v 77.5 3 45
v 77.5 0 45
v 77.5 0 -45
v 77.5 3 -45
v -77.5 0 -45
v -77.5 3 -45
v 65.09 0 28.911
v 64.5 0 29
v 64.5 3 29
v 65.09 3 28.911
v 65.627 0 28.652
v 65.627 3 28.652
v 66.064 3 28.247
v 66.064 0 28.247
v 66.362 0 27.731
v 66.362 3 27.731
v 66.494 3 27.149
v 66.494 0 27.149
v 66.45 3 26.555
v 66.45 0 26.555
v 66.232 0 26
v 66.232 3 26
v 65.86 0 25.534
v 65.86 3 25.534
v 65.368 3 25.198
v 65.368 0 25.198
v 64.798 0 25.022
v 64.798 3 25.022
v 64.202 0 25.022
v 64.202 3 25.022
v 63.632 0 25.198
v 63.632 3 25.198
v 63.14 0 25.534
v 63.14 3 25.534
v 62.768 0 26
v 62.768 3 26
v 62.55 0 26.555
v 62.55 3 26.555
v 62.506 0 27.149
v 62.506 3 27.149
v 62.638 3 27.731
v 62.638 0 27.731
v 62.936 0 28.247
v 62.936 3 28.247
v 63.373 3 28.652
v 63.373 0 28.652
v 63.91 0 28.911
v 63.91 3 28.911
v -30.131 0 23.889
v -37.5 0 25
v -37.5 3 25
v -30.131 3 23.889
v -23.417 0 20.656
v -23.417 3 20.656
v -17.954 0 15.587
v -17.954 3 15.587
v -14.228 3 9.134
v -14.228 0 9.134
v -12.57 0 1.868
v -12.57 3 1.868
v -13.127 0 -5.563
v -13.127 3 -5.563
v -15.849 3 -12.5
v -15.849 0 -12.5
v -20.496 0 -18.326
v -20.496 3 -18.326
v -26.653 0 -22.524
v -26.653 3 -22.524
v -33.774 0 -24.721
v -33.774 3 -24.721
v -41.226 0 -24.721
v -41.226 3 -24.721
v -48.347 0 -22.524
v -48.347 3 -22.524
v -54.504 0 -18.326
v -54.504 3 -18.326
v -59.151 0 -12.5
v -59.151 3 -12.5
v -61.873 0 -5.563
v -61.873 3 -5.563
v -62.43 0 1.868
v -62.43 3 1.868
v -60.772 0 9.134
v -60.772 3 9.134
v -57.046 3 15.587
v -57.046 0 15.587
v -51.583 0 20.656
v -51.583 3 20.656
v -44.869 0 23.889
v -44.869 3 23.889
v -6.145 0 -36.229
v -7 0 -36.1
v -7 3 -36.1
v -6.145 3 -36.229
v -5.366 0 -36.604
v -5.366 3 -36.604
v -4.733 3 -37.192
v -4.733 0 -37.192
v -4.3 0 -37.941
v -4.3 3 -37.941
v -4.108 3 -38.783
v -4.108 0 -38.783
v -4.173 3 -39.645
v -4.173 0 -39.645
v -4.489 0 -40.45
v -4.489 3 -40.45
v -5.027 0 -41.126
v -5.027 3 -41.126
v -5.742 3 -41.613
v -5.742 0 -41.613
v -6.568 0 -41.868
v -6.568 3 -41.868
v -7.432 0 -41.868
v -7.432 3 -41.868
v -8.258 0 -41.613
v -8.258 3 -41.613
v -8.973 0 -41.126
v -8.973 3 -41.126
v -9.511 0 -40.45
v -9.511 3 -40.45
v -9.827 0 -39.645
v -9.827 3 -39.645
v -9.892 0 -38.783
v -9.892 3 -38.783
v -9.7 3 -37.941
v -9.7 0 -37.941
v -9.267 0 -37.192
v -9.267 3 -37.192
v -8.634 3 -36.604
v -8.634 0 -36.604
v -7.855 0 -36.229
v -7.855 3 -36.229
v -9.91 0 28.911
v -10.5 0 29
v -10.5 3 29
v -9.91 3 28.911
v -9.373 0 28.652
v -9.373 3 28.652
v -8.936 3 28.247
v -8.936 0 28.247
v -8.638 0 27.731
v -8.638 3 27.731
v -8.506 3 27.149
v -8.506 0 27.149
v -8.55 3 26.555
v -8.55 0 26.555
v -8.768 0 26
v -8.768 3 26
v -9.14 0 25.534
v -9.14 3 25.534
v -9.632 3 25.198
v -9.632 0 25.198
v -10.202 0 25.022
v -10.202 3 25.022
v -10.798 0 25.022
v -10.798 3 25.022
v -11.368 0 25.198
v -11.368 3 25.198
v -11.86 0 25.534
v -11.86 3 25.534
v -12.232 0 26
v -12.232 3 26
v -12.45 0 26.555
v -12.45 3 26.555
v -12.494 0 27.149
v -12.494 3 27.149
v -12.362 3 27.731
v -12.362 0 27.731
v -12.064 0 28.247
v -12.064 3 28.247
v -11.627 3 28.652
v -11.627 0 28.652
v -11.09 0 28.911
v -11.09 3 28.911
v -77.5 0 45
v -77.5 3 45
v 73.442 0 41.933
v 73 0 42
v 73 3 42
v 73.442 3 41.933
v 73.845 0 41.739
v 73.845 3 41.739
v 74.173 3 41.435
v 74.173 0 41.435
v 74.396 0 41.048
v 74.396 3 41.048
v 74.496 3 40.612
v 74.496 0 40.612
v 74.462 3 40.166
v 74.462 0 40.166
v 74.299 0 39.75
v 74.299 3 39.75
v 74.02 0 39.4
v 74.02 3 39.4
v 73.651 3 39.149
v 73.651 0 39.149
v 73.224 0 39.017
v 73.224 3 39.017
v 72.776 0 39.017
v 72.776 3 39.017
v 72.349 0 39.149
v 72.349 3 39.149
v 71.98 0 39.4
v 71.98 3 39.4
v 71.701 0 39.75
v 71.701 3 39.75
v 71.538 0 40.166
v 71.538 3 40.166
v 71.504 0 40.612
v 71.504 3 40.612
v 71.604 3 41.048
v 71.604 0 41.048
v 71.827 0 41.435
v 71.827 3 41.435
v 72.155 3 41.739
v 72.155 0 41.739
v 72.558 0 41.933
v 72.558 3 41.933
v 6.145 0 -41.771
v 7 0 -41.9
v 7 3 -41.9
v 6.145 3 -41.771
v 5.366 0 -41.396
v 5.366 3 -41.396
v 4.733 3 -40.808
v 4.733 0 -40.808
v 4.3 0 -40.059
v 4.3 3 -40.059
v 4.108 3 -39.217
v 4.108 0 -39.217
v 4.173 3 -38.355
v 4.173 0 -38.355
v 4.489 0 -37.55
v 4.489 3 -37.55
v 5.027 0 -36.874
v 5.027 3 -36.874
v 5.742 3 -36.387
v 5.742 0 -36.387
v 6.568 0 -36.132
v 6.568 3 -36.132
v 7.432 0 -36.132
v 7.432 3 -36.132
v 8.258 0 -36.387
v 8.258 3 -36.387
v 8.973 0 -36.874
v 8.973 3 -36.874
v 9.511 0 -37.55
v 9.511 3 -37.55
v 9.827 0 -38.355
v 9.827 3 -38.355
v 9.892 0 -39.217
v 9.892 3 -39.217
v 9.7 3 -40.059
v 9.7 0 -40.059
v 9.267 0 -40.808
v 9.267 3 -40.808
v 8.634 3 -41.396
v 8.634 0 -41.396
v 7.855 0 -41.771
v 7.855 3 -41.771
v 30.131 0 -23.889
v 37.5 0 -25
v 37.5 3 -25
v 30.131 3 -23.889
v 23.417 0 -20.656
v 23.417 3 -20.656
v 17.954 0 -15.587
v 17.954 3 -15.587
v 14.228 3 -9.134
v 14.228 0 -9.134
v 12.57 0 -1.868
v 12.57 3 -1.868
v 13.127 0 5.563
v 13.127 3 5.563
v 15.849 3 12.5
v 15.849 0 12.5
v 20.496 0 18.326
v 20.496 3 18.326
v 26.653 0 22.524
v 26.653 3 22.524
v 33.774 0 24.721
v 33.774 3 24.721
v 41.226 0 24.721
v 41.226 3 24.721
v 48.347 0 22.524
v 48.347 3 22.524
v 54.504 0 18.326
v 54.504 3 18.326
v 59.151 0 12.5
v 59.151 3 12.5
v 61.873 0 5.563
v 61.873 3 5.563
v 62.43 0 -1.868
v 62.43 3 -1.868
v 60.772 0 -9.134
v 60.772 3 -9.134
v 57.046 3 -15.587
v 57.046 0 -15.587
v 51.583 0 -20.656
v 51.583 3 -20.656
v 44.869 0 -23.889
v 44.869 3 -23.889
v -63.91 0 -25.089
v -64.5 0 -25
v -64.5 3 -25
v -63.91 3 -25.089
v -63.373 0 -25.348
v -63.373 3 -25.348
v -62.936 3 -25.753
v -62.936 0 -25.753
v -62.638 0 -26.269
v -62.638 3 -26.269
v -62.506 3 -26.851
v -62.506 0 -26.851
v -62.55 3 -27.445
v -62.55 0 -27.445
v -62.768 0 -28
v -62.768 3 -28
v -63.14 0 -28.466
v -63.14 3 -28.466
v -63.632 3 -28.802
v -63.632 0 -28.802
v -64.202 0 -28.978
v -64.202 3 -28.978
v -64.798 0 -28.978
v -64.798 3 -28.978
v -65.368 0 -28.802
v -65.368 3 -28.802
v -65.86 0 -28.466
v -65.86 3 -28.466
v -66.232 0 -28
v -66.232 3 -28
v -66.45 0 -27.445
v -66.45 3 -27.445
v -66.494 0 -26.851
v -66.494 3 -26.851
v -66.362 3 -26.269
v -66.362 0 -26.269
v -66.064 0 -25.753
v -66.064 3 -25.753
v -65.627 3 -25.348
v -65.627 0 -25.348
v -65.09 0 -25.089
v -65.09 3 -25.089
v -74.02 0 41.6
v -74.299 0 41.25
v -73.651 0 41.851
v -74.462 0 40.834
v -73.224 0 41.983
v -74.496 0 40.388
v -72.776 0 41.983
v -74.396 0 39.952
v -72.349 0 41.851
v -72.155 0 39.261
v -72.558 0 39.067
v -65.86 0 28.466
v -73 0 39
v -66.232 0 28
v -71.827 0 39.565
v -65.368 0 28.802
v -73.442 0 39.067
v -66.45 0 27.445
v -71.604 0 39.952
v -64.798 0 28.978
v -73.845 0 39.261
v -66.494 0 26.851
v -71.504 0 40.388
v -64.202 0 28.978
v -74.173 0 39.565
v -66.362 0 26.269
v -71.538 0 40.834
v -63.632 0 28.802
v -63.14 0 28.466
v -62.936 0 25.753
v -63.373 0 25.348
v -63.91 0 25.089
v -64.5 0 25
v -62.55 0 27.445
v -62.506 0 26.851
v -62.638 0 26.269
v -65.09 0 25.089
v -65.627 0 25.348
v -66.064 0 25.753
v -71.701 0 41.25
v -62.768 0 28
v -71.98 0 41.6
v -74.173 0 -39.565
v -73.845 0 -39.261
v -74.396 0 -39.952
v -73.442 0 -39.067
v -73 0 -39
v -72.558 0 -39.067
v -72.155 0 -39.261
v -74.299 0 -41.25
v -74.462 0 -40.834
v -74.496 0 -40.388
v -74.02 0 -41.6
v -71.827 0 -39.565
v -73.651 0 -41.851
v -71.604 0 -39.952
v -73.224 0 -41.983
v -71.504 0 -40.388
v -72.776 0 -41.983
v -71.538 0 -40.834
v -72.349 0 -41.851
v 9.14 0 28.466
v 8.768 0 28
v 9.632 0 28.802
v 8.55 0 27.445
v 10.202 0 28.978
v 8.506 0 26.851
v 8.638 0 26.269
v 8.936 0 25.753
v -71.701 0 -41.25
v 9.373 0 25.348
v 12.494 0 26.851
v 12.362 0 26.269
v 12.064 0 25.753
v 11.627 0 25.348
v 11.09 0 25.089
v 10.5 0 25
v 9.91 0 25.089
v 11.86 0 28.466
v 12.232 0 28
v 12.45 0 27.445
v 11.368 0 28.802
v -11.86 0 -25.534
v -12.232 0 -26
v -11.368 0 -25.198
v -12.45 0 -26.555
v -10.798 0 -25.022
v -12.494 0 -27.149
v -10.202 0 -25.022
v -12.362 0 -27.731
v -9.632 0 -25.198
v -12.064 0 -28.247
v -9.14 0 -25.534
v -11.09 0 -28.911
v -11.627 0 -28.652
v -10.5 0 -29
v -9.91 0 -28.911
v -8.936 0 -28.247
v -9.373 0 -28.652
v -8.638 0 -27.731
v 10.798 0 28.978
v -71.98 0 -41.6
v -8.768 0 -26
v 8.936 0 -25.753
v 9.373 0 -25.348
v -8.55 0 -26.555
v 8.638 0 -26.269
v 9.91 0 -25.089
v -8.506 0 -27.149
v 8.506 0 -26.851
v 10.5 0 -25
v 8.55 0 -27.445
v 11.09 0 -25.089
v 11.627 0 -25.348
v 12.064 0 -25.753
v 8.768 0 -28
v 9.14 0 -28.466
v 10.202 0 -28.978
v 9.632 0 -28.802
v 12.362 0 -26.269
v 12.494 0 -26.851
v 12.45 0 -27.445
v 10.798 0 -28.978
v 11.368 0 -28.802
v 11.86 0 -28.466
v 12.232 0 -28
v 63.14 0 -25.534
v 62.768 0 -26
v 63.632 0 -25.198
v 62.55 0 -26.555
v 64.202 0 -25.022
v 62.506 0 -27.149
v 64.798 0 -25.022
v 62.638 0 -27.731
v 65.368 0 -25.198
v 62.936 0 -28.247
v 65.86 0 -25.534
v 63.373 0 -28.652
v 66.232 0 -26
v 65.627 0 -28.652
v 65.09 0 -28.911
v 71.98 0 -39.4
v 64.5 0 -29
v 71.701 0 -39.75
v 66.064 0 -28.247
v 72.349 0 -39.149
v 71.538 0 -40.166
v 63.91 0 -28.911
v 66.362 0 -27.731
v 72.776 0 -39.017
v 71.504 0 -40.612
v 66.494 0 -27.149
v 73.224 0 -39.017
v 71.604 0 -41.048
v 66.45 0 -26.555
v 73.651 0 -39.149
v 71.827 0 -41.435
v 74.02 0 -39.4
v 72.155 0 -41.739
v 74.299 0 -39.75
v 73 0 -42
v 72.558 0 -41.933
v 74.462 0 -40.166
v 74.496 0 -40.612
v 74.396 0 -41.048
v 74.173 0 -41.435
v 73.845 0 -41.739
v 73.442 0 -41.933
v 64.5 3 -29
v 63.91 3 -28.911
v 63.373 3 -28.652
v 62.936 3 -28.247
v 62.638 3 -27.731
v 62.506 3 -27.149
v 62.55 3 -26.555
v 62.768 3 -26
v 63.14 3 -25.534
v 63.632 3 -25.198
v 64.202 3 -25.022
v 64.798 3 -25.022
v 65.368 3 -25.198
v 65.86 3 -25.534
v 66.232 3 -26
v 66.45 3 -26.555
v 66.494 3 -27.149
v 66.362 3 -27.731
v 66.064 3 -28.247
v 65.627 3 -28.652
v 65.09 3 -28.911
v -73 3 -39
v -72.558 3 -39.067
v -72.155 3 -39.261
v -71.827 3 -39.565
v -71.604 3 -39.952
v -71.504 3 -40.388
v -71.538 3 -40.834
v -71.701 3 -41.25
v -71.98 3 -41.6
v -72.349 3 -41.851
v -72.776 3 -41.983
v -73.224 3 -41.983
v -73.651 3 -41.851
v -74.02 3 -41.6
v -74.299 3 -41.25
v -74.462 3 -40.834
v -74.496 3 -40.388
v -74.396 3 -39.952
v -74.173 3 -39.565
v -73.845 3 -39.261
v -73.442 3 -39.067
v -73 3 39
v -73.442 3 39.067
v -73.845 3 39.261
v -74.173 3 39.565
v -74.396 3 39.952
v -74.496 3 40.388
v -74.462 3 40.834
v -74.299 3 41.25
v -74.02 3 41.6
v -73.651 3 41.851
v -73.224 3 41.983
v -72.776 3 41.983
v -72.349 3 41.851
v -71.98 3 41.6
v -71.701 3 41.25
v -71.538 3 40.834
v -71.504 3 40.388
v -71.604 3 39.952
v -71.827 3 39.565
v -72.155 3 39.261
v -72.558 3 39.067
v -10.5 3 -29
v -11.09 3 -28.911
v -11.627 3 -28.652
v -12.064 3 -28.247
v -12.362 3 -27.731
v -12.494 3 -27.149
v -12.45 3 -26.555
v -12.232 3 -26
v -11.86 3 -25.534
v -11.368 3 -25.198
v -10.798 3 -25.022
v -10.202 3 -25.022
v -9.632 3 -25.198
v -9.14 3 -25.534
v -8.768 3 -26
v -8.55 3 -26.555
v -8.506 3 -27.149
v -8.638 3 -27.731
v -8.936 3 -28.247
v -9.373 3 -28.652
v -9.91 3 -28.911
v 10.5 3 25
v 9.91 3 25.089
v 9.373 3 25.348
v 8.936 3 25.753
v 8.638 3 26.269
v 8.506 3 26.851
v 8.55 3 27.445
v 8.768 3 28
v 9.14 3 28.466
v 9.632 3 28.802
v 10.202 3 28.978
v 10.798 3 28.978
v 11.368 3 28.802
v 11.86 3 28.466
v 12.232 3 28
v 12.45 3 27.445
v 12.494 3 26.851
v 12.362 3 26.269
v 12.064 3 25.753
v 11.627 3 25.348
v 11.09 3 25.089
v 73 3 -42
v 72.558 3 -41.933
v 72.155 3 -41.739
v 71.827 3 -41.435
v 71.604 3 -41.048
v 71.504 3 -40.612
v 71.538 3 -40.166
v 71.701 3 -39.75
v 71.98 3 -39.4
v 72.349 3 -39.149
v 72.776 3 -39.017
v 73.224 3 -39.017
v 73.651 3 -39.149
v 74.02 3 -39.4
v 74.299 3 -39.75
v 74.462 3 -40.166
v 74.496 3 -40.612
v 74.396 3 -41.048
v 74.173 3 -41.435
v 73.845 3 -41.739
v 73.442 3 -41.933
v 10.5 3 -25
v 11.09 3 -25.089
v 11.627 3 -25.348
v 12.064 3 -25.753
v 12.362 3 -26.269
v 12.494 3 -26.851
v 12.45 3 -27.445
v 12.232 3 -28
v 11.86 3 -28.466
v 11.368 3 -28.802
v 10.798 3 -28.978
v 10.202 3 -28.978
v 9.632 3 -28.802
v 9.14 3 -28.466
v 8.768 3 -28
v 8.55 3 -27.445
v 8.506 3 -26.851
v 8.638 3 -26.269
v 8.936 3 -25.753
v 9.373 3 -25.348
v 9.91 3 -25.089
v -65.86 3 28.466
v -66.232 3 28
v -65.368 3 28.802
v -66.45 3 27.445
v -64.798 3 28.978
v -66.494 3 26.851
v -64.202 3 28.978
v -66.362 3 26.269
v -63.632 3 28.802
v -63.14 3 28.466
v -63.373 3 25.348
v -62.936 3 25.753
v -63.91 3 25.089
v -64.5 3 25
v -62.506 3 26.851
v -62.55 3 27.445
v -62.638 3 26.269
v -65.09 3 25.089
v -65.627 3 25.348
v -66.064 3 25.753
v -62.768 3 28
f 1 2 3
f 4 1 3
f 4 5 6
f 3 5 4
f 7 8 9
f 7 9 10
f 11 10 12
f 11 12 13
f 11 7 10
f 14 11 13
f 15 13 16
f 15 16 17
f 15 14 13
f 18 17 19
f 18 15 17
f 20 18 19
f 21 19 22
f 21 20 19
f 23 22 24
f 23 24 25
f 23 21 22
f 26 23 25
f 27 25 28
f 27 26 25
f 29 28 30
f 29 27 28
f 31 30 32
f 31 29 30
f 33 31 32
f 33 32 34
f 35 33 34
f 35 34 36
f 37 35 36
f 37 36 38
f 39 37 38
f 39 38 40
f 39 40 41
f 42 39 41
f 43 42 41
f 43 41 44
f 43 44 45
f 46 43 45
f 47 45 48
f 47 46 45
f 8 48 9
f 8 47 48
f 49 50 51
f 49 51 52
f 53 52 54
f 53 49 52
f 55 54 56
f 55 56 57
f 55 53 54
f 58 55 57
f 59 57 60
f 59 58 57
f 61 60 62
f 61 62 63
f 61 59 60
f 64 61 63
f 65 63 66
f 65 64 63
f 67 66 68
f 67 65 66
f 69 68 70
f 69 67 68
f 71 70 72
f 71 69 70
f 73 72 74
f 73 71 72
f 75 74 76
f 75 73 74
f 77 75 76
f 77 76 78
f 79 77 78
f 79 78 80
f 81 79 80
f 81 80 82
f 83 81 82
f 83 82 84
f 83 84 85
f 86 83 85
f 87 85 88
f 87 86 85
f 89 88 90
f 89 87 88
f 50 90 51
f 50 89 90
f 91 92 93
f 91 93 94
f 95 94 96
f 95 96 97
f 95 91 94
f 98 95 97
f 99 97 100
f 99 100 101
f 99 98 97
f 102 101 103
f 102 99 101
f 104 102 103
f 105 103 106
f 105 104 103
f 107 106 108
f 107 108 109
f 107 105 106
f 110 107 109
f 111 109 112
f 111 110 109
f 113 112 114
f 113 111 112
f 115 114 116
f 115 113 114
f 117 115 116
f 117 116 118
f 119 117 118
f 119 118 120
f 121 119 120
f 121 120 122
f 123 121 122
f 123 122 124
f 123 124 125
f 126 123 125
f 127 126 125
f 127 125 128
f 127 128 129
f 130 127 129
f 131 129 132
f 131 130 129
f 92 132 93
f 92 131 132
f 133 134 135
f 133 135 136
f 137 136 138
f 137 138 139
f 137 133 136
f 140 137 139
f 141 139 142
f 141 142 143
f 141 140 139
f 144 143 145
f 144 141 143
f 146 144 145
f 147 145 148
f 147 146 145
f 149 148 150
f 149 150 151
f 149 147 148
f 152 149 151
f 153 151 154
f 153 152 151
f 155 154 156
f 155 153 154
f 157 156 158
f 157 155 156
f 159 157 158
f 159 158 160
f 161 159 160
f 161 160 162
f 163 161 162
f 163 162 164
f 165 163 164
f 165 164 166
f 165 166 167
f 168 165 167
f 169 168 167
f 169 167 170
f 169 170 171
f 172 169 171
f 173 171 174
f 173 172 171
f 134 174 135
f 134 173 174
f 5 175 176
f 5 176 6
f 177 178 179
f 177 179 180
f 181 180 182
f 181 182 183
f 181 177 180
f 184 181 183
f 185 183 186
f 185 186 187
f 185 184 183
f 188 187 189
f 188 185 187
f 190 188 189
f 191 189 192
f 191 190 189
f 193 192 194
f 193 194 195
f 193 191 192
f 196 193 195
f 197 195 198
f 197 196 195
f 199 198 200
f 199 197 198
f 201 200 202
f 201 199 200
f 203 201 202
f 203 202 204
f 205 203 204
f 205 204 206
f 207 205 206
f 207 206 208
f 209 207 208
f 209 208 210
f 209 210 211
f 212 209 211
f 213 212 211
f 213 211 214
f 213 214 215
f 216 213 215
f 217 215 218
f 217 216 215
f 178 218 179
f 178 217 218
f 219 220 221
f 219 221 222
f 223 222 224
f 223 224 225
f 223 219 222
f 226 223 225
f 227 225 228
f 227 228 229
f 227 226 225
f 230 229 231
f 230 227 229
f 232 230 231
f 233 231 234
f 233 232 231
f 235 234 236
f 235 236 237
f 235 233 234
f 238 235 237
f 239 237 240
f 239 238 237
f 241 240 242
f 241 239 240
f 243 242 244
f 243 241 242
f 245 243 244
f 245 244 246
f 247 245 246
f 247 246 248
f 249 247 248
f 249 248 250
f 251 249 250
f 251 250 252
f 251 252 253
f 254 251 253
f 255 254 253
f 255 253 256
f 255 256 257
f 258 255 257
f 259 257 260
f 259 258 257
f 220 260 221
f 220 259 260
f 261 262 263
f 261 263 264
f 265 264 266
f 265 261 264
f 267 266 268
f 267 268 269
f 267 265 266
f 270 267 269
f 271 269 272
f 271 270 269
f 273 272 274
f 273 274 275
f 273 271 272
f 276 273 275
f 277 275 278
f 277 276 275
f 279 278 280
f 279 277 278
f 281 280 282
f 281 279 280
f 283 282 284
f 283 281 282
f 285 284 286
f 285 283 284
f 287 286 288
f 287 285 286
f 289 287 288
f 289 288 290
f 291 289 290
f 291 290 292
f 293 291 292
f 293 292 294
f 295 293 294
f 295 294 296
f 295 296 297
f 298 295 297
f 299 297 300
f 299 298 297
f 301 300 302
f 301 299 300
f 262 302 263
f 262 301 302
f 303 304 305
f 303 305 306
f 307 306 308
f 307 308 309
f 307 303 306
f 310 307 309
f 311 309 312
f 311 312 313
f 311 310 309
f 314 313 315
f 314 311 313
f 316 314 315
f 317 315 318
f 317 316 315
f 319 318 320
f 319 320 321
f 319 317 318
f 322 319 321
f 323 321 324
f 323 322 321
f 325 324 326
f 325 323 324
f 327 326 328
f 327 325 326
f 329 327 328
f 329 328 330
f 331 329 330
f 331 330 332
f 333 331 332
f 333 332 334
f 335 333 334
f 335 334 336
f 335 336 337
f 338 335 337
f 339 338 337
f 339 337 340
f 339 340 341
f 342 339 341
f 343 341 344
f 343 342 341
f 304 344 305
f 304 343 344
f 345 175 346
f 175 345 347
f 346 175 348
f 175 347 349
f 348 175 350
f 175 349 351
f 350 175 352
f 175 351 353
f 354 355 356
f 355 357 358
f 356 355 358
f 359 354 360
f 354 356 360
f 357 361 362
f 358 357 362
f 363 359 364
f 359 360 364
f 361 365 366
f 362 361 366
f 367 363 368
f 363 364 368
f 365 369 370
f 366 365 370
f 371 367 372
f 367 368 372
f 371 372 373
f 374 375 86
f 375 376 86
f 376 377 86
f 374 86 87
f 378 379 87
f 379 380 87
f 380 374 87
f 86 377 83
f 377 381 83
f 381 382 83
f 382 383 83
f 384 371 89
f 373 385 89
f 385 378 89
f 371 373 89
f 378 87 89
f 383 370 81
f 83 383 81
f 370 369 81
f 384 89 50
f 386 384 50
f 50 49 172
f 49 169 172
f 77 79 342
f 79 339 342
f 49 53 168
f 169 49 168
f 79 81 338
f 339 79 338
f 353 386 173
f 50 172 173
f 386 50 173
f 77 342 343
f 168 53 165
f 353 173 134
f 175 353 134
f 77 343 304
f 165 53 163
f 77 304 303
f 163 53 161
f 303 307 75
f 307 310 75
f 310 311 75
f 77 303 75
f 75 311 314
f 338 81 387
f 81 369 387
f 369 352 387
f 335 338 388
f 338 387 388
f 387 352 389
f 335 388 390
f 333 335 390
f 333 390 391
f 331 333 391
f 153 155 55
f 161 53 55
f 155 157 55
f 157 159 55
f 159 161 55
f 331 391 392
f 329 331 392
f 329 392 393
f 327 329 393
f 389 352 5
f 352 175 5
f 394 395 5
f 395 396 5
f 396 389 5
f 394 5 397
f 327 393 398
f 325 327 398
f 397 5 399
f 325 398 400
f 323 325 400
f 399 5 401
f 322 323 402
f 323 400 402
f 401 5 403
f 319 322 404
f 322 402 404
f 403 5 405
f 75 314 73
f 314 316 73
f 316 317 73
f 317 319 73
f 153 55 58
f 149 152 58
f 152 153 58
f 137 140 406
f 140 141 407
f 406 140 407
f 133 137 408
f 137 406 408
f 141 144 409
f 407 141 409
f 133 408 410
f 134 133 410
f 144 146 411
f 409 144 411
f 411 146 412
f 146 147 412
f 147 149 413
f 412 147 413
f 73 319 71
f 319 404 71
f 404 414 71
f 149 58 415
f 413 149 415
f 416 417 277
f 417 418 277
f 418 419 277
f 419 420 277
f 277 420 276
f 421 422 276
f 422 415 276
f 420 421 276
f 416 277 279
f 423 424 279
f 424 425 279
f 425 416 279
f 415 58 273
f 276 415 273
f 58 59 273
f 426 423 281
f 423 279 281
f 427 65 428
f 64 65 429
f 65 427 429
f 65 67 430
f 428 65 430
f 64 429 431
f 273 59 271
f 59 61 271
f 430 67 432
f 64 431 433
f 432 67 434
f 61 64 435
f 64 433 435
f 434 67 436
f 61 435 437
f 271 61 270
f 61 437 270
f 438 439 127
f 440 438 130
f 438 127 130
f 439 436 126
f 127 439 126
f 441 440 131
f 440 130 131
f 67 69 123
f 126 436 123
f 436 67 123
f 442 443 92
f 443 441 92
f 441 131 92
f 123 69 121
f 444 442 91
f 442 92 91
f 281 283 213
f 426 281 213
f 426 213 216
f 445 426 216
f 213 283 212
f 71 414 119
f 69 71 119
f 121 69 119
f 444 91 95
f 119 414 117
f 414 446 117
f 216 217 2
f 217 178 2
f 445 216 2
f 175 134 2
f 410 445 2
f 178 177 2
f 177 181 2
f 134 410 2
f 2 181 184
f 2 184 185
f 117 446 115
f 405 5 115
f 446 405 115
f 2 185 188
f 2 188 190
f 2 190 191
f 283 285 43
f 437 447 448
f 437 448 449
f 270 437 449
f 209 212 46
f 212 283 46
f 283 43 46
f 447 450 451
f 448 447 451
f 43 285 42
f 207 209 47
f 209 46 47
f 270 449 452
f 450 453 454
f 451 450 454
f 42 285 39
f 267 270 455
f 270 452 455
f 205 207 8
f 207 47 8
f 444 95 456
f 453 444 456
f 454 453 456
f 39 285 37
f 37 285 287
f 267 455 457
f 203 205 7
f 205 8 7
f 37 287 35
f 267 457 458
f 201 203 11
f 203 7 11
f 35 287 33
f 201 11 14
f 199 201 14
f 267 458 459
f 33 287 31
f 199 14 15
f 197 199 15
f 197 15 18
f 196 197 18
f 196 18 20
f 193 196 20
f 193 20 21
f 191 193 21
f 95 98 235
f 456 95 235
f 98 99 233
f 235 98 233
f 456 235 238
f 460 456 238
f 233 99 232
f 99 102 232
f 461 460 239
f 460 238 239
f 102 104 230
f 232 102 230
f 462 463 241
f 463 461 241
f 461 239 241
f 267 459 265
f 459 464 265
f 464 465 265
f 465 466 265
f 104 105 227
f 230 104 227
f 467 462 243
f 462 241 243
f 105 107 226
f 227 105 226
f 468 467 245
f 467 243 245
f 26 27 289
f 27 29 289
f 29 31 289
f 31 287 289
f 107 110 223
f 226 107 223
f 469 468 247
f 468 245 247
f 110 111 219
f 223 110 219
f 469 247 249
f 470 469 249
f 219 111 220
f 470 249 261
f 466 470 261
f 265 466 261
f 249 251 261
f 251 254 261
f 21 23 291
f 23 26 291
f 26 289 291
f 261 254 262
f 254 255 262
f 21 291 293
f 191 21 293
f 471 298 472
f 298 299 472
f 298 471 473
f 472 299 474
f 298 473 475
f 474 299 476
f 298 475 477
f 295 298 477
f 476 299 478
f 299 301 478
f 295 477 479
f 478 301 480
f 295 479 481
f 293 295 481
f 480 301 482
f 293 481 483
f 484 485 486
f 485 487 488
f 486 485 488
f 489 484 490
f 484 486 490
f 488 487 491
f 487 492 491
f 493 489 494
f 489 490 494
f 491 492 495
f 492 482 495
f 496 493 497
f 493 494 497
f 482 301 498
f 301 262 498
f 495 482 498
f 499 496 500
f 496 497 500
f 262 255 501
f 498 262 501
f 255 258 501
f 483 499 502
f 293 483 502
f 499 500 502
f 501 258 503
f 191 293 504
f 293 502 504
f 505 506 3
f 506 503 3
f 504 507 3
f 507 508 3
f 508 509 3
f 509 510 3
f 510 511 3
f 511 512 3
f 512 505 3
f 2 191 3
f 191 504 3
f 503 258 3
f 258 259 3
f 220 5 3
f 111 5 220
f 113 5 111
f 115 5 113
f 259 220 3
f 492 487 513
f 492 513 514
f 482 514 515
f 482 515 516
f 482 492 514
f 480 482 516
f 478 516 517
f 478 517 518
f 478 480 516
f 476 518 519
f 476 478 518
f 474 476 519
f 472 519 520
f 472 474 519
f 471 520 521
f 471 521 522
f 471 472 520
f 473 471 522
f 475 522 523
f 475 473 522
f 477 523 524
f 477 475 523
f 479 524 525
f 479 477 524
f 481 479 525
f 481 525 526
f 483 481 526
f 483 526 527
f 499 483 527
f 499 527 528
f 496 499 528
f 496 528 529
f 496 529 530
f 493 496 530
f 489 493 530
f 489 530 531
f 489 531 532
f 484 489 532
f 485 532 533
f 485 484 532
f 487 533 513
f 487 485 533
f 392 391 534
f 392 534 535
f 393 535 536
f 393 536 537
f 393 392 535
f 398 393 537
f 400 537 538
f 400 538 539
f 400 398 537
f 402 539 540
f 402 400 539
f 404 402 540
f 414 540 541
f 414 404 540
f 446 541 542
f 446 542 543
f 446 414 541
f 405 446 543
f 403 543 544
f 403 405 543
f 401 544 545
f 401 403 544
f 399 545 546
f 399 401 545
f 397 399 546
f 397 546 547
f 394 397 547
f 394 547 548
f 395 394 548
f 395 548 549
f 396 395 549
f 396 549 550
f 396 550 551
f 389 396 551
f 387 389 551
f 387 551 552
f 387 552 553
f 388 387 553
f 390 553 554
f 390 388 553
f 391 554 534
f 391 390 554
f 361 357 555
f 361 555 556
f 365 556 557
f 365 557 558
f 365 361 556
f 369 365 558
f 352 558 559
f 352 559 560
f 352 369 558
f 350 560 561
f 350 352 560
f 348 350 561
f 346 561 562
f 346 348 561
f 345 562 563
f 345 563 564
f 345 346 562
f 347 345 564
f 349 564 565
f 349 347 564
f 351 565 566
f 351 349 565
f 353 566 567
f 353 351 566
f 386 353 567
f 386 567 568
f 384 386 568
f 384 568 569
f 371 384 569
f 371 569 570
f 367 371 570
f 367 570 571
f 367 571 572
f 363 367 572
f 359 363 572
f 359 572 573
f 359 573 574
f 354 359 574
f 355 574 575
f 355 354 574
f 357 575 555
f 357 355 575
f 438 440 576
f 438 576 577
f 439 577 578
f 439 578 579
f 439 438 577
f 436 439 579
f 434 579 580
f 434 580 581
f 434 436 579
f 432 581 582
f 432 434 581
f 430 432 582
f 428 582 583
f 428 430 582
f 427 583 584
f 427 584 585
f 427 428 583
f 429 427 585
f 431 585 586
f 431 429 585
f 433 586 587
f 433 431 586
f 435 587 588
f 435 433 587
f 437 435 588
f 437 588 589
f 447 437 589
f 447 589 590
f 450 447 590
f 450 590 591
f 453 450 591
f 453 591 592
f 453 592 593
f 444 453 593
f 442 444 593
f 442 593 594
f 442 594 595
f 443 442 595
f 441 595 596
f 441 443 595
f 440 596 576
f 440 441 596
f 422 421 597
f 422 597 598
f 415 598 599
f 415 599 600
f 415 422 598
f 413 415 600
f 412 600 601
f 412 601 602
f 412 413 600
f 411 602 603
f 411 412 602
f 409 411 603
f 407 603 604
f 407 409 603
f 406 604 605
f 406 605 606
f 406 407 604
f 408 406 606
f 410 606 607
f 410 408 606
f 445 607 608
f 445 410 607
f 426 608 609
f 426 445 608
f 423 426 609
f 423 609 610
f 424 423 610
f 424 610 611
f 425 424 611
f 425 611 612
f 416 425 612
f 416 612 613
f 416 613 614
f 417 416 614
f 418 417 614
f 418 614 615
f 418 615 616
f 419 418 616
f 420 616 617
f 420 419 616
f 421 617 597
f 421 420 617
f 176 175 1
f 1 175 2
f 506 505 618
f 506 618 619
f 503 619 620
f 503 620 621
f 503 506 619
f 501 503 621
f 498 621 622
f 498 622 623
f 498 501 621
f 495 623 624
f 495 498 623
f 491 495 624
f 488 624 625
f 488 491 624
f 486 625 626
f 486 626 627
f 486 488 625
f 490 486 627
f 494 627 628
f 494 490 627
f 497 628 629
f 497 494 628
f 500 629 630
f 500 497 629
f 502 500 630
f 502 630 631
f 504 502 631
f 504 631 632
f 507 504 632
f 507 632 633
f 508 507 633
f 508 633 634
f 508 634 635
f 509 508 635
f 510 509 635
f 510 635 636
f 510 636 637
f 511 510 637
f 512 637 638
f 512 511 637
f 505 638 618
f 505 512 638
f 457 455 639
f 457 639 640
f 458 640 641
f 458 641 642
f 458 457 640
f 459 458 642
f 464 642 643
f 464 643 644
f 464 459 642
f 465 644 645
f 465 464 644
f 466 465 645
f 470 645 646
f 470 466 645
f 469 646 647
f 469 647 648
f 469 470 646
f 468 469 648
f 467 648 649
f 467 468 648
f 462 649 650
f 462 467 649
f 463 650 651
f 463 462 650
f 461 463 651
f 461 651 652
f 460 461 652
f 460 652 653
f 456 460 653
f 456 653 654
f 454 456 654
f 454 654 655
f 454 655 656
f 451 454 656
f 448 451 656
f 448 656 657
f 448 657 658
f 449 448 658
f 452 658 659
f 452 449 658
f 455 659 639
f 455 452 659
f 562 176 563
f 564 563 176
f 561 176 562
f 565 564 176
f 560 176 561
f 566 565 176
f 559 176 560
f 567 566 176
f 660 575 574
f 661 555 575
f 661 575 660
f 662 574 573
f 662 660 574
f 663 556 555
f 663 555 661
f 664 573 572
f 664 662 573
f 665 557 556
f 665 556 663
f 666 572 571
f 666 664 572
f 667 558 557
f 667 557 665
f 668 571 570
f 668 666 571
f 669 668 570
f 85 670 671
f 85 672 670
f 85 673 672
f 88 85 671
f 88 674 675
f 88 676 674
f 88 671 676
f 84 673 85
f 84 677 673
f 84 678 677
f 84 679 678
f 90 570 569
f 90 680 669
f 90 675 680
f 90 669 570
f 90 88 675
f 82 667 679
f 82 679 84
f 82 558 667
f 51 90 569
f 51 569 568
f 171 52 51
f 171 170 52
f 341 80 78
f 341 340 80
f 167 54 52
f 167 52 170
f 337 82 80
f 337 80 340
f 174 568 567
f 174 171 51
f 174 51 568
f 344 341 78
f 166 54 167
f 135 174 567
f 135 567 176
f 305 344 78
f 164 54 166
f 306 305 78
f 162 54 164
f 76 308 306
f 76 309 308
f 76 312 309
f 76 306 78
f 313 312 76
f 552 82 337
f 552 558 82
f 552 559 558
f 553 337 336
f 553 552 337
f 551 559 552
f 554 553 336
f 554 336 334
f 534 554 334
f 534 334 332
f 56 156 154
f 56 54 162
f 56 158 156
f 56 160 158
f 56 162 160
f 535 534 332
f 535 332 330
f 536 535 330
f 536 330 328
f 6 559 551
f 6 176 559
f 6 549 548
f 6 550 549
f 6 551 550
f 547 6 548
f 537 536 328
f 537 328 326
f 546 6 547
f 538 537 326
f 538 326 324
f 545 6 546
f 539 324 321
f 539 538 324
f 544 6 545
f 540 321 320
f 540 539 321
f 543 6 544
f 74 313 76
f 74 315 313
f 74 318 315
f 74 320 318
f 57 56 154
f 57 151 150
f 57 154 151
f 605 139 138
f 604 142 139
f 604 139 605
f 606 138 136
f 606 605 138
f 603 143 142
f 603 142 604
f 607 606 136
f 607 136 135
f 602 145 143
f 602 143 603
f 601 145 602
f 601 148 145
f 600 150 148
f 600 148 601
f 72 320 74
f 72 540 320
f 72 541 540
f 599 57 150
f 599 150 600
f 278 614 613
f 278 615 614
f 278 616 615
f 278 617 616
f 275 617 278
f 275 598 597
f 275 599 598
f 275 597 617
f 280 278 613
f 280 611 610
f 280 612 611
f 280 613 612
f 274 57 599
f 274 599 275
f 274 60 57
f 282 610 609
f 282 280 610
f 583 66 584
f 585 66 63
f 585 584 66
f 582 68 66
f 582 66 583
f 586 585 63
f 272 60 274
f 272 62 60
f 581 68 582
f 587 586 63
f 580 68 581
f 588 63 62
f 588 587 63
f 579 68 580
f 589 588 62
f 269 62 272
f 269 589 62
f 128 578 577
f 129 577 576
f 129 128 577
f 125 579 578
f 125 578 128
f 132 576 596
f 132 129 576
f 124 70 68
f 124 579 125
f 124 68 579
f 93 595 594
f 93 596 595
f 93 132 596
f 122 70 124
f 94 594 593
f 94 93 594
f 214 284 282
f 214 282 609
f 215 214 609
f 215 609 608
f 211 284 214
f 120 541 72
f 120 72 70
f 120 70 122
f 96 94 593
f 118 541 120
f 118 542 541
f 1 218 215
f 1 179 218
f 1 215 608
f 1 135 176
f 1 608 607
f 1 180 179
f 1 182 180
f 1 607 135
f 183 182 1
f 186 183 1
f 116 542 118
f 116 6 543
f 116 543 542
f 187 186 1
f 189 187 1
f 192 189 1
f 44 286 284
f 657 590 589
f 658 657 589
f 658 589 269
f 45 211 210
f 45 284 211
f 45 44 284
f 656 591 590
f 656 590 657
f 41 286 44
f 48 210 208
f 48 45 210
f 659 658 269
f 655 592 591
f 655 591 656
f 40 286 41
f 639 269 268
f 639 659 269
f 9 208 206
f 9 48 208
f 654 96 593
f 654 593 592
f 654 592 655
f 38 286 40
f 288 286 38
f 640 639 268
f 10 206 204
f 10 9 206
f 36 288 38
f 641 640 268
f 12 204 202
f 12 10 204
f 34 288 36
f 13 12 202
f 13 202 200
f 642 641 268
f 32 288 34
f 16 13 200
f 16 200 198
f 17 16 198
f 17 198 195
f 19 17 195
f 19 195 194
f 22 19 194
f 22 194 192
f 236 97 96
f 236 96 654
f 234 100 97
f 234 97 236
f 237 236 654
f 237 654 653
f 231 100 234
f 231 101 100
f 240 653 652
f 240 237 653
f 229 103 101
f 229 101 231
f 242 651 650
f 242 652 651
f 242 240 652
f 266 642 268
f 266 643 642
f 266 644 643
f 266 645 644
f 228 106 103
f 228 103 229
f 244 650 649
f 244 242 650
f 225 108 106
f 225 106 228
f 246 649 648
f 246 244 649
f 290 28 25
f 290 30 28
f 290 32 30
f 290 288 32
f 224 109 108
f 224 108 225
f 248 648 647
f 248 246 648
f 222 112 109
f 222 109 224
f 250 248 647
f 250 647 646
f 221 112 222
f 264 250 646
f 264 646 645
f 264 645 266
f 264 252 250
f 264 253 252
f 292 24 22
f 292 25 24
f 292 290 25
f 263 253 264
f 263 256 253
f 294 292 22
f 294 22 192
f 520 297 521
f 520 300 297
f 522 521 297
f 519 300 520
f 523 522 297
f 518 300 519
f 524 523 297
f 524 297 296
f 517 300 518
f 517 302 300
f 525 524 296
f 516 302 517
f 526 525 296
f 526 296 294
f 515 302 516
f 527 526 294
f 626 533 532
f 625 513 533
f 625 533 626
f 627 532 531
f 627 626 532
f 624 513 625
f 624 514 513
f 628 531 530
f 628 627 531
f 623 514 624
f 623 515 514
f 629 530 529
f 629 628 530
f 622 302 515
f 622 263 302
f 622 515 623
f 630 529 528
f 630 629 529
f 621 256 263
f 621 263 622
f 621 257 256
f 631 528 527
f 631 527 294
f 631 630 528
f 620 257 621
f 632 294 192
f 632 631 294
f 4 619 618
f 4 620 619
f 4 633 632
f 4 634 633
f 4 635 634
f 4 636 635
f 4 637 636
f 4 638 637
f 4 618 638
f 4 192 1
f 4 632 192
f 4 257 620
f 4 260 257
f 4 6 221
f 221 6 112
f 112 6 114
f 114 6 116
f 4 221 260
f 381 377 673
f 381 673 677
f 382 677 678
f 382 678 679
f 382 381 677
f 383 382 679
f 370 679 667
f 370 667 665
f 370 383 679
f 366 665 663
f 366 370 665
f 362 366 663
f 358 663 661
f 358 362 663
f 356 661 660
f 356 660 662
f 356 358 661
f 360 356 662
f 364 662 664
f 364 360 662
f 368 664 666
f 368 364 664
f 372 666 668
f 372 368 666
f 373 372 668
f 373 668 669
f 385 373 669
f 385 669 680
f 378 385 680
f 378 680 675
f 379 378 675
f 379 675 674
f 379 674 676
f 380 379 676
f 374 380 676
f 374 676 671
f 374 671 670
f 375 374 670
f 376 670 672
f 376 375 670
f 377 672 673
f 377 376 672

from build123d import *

# Parameters (mm, degrees)
ESQUISSE1_W        = 155
ESQUISSE1_H        = 90
ESQUISSE1_R        = 25
ESQUISSE1_R_2      = 2
ESQUISSE1_R_3      = 1.5
ESQUISSE1_R_4      = 2.9
BOSS_EXTRU_1_DEPTH = 3


with BuildPart() as part:
    # Esquisse1 → Boss.-Extru.1 (new body)
    with BuildSketch(Plane(origin=(0, 0, 0), x_dir=(1, 0, 0), z_dir=(0, 1, 0))):
        Rectangle(ESQUISSE1_W, ESQUISSE1_H)
        with Locations(Location((-37.5, 0, 0), (0, 0, 270))):
            Circle(ESQUISSE1_R, mode=Mode.SUBTRACT)
        with Locations(Location((-64.5, 27, 0), (0, 0, 270))):
            Circle(ESQUISSE1_R_2, mode=Mode.SUBTRACT)
        with Locations(Location((-10.5, 27, 0), (0, 0, 90))):
            Circle(ESQUISSE1_R_2, mode=Mode.SUBTRACT)
        with Locations(Location((-10.5, -27, 0), (0, 0, 270))):
            Circle(ESQUISSE1_R_2, mode=Mode.SUBTRACT)
        with Locations(Location((-64.5, -27, 0), (0, 0, 90))):
            Circle(ESQUISSE1_R_2, mode=Mode.SUBTRACT)
        with Locations(Location((10.5, -27, 0), (0, 0, 90))):
            Circle(ESQUISSE1_R_2, mode=Mode.SUBTRACT)
        with Locations(Location((64.5, -27, 0), (0, 0, 270))):
            Circle(ESQUISSE1_R_2, mode=Mode.SUBTRACT)
        with Locations(Location((64.5, 27, 0), (0, 0, 90))):
            Circle(ESQUISSE1_R_2, mode=Mode.SUBTRACT)
        with Locations(Location((10.5, 27, 0), (0, 0, 270))):
            Circle(ESQUISSE1_R_2, mode=Mode.SUBTRACT)
        with Locations(Location((37.5, 0, 0), (0, 0, 90))):
            Circle(ESQUISSE1_R, mode=Mode.SUBTRACT)
        with Locations(Location((-73, 40.5, 0), (0, 0, 270))):
            Circle(ESQUISSE1_R_3, mode=Mode.SUBTRACT)
        with Locations(Location((73, 40.5, 0), (0, 0, 90))):
            Circle(ESQUISSE1_R_3, mode=Mode.SUBTRACT)
        with Locations(Location((73, -40.5, 0), (0, 0, 270))):
            Circle(ESQUISSE1_R_3, mode=Mode.SUBTRACT)
        with Locations(Location((-73, -40.5, 0), (0, 0, 90))):
            Circle(ESQUISSE1_R_3, mode=Mode.SUBTRACT)
        with Locations(Location((-7, 39, 0), (0, 0, 270))):
            Circle(ESQUISSE1_R_4, mode=Mode.SUBTRACT)
        with Locations(Location((7, 39, 0), (0, 0, 90))):
            Circle(ESQUISSE1_R_4, mode=Mode.SUBTRACT)
    extrude(amount=BOSS_EXTRU_1_DEPTH)


solid = part.part
